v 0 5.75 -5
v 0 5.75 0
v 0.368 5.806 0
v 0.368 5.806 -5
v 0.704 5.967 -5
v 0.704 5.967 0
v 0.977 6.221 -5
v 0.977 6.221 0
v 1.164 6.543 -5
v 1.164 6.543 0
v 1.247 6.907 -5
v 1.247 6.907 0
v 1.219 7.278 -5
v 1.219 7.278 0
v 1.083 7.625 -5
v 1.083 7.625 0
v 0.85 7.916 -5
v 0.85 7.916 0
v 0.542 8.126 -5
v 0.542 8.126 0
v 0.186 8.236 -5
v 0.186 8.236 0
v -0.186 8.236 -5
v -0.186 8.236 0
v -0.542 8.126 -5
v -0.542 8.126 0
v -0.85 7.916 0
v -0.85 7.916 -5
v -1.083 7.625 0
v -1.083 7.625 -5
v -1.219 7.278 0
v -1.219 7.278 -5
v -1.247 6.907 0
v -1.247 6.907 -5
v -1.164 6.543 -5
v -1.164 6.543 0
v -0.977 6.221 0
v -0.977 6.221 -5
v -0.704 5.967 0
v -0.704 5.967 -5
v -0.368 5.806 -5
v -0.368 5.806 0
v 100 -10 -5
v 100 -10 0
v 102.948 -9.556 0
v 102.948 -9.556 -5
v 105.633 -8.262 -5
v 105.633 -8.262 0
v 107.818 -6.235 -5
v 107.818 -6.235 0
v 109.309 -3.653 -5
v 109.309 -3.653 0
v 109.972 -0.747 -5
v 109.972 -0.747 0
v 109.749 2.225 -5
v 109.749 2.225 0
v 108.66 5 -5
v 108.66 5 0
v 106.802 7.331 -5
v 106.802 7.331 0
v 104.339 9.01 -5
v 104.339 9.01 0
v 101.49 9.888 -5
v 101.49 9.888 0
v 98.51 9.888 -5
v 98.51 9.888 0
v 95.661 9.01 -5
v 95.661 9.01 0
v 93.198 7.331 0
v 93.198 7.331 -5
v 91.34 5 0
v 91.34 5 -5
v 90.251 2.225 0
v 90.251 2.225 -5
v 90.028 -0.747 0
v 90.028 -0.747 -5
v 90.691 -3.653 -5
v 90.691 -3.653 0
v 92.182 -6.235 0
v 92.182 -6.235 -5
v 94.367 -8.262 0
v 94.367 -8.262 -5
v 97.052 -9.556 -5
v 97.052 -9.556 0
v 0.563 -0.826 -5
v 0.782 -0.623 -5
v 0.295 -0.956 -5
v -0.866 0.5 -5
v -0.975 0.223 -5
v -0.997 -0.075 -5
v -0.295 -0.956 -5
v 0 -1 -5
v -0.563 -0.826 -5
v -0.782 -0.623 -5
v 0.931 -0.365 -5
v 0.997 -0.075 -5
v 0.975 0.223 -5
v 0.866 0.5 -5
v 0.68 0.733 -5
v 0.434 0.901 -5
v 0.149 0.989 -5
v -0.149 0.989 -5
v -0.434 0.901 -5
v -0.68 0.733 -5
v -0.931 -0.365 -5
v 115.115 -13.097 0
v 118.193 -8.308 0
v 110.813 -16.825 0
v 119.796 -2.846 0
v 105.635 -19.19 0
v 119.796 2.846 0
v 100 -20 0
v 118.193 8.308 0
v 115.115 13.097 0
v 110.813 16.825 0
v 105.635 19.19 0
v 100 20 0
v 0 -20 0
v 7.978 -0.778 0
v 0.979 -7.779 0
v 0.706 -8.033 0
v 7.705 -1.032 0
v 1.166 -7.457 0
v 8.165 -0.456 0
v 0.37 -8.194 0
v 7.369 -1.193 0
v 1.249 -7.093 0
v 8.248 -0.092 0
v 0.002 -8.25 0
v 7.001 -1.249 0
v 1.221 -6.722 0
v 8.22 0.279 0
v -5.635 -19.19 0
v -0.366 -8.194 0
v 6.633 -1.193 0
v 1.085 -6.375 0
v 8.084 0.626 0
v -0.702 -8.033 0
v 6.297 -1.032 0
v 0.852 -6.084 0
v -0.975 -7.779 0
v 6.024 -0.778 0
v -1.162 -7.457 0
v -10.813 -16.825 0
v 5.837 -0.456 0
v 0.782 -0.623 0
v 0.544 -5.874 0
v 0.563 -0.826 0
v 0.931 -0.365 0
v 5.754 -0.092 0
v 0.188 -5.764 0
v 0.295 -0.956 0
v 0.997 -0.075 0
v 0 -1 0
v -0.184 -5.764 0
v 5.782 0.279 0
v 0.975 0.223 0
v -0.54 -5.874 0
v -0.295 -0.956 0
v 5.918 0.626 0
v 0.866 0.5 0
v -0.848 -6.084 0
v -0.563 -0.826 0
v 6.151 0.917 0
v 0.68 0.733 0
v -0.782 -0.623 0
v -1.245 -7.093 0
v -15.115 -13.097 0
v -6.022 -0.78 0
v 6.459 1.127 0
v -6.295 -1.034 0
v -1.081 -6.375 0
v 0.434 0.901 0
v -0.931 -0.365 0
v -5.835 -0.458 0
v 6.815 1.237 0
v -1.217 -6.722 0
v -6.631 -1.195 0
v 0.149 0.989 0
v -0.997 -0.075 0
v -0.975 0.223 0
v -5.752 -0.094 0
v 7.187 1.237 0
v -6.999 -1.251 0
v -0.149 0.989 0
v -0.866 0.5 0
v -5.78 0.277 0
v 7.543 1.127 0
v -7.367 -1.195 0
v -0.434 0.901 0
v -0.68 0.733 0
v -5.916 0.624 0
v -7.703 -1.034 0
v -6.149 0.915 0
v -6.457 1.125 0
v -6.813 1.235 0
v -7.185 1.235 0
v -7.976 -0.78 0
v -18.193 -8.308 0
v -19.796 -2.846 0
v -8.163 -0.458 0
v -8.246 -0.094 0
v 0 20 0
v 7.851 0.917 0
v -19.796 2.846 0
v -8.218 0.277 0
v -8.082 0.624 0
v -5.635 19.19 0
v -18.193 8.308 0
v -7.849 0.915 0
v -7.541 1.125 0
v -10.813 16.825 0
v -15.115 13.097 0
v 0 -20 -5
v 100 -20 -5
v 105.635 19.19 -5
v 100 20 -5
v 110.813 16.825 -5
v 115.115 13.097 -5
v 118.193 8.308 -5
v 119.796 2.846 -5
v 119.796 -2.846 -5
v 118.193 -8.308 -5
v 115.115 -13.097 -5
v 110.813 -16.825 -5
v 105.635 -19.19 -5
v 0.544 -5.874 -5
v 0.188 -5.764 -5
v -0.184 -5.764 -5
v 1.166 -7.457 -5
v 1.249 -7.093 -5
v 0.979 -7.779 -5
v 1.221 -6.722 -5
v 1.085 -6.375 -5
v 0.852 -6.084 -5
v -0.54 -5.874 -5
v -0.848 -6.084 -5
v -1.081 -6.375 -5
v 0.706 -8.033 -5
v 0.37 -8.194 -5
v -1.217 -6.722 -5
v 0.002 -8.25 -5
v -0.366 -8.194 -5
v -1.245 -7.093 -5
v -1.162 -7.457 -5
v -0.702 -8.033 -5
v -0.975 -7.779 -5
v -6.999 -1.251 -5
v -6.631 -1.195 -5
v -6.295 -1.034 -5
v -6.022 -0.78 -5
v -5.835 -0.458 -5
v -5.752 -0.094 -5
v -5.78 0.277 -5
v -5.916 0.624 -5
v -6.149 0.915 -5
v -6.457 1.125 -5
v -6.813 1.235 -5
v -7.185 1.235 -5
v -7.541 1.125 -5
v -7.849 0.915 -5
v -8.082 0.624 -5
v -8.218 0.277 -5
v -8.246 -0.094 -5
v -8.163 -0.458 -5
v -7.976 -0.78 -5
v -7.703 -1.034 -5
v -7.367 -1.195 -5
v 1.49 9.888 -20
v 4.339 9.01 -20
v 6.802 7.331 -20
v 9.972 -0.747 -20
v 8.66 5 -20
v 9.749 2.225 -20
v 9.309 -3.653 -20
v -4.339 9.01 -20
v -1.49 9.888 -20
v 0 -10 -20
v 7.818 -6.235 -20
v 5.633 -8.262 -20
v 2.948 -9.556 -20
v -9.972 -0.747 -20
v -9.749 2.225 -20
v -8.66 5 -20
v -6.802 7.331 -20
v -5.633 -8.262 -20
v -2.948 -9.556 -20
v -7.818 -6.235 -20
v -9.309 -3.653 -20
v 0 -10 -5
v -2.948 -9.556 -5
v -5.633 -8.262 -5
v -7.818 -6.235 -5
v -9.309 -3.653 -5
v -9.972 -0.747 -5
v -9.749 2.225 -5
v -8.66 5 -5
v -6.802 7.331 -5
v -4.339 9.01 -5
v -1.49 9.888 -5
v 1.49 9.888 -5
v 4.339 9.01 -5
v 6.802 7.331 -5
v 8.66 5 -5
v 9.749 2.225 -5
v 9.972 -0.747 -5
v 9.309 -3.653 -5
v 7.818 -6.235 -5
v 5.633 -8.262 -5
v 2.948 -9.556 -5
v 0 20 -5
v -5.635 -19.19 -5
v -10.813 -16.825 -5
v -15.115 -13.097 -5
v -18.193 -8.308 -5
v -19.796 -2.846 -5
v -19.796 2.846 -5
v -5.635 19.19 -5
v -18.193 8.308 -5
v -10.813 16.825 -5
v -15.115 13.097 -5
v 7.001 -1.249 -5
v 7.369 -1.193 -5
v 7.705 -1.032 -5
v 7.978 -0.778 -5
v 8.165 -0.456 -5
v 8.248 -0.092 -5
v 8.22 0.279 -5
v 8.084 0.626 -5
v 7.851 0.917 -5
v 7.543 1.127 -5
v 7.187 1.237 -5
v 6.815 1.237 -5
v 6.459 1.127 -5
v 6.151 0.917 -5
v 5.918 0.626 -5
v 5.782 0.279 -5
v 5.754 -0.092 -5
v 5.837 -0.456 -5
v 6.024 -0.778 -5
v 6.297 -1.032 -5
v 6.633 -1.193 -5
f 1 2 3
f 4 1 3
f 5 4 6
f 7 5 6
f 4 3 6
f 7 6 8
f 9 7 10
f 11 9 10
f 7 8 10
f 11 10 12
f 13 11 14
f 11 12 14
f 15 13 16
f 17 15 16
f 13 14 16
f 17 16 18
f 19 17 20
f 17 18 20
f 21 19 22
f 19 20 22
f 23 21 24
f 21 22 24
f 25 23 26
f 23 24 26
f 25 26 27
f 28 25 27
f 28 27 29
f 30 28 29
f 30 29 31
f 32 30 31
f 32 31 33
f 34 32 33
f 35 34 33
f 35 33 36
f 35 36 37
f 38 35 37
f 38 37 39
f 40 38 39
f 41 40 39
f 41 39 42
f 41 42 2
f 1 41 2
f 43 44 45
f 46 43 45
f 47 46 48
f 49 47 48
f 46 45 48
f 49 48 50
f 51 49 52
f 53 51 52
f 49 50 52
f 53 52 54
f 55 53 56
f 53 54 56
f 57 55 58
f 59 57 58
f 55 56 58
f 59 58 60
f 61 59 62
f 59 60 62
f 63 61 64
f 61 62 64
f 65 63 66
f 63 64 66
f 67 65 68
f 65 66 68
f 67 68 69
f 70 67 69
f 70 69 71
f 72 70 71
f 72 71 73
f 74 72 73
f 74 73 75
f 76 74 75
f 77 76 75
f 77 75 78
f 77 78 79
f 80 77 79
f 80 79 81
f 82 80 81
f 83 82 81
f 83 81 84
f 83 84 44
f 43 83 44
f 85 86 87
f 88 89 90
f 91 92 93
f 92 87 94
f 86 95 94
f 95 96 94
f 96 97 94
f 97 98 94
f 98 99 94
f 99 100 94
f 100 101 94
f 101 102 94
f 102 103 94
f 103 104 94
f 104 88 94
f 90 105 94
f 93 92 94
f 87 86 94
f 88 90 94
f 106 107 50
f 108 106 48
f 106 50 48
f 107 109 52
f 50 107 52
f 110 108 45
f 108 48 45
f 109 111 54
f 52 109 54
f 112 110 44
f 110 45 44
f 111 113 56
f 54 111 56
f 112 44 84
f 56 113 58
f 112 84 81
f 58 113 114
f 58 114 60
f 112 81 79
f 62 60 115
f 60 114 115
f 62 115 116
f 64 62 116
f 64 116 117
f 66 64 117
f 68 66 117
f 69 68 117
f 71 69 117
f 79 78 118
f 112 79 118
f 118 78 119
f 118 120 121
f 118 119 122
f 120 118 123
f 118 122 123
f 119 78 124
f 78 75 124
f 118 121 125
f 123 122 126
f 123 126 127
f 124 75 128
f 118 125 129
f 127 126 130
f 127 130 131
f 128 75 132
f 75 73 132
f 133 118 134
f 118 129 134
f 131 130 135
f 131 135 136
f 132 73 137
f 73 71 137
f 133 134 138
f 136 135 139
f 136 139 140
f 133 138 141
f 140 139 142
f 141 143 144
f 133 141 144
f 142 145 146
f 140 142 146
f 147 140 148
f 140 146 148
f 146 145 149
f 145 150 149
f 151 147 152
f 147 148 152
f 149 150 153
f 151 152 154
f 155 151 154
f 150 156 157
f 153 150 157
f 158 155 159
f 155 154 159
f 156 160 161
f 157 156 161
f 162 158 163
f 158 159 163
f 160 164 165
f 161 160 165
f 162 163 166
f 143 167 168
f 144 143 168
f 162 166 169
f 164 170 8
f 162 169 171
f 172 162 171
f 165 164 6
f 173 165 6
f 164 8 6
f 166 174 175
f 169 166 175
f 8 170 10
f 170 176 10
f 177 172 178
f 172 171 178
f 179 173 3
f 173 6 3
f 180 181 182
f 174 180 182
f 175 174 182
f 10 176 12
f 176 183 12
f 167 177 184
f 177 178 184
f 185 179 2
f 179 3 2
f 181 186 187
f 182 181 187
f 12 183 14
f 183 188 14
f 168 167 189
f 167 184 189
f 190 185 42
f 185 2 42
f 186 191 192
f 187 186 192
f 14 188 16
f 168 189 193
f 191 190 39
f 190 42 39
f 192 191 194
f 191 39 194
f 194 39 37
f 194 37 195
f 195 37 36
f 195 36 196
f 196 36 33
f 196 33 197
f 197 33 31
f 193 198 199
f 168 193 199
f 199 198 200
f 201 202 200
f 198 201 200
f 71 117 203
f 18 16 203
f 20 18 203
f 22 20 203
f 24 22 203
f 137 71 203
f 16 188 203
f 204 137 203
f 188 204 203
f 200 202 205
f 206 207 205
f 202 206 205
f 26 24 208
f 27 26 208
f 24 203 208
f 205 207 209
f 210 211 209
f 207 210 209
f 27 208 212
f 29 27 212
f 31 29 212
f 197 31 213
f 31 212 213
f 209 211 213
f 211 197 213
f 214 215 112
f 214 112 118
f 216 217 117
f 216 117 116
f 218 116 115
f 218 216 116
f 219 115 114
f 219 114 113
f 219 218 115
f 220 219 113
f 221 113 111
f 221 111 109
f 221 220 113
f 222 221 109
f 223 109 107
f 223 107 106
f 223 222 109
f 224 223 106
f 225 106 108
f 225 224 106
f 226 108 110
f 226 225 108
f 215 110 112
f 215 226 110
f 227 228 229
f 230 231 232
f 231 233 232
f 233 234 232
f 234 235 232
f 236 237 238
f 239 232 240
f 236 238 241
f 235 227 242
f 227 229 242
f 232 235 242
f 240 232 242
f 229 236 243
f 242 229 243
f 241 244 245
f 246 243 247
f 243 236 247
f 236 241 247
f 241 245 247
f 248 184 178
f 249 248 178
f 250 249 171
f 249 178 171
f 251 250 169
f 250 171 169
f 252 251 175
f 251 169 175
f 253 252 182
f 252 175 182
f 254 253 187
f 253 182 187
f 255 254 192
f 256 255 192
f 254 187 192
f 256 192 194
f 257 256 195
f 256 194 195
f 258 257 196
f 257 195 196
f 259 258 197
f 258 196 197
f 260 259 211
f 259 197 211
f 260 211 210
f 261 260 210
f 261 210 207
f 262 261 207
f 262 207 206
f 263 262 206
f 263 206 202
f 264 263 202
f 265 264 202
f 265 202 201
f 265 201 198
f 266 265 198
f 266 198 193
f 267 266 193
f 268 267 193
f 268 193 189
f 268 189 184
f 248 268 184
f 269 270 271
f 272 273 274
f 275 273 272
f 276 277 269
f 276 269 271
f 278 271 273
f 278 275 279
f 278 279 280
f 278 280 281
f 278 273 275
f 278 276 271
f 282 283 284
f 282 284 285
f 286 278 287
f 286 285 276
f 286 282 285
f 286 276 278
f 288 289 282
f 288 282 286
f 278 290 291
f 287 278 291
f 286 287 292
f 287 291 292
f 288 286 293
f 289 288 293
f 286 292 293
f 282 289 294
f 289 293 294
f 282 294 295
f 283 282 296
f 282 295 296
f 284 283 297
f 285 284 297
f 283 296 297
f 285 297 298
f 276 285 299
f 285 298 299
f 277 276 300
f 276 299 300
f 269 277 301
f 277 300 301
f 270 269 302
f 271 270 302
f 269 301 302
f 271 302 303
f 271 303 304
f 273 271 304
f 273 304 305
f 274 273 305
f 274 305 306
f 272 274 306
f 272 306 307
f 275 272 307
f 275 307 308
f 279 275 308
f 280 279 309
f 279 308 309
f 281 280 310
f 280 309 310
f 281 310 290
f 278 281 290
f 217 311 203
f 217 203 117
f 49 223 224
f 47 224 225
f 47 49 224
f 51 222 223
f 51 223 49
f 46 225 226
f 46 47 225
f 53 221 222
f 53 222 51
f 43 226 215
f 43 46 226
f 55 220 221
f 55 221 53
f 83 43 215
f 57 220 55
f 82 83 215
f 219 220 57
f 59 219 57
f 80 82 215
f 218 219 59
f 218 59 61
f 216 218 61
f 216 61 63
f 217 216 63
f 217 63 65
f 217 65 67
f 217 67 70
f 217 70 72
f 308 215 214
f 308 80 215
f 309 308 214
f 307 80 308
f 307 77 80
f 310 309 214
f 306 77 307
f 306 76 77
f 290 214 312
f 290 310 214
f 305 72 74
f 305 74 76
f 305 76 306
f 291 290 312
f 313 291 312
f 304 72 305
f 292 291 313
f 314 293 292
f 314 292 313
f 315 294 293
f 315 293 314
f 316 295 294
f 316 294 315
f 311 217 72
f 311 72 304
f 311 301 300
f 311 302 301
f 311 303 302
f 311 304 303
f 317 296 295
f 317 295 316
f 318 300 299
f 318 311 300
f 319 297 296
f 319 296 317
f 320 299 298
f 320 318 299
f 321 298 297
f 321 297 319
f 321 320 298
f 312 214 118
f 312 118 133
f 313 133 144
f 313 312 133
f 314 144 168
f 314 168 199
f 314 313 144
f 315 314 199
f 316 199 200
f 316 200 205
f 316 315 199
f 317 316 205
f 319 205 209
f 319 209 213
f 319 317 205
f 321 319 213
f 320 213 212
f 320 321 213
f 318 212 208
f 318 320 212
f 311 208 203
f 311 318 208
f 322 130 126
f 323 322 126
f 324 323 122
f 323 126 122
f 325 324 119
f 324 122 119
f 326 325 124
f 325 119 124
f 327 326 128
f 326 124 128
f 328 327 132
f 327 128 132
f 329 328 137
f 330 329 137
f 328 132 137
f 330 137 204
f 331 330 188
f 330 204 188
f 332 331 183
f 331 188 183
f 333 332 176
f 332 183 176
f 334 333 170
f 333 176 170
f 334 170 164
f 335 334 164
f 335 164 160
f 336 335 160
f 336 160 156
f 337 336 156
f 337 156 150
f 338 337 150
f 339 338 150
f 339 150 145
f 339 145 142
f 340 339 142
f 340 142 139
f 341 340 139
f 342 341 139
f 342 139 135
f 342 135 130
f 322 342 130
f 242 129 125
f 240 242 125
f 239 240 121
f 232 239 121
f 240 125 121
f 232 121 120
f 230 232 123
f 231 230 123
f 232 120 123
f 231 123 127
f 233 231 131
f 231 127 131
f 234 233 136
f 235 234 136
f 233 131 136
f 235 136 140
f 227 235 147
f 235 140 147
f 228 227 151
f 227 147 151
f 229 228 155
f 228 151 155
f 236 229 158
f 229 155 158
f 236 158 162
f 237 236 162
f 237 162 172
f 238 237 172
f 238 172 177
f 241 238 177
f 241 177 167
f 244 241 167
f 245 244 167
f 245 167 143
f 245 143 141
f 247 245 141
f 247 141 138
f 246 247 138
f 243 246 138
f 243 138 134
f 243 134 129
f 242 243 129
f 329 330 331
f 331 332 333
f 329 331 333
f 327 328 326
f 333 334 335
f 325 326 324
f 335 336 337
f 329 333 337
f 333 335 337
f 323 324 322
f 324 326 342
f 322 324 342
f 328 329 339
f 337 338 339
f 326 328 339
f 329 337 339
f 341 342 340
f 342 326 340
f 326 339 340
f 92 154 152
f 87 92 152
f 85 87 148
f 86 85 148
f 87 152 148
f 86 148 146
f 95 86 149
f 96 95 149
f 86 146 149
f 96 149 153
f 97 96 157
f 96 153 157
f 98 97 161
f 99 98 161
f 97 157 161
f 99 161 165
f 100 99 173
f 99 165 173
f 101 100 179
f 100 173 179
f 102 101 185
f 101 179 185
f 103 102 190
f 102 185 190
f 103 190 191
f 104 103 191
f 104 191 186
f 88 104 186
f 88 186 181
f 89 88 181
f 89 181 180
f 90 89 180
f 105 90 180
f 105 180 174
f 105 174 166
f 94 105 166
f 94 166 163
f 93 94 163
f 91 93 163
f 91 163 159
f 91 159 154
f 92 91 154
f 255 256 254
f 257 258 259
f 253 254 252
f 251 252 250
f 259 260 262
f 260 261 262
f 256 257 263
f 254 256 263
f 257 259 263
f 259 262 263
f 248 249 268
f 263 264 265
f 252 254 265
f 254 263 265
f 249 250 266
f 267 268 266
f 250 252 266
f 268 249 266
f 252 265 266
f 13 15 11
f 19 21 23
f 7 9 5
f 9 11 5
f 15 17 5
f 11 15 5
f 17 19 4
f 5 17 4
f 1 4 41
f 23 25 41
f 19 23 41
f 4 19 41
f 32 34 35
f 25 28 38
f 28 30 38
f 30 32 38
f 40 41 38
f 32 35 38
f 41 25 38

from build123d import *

# Parameters (mm, degrees)
BOSS_EXTRUDE1_DEPTH   = 5
CUT_EXTRUDE1_REACH    = 123.758
SKETCH2_R             = 1
SKETCH2_R_2           = 1.25
CUT_EXTRUDE2_REACH    = 123.758
SKETCH3_R             = 10
SKETCH4_R             = 10
BOSS_EXTRUDE2_DEPTH   = 15
BODY_MOVE_COPY1_ANGLE = 90


with BuildPart() as part:
    # Sketch1 → Boss-Extrude1 (new body)
    with BuildSketch(Plane(origin=(0, 0, 0), x_dir=(1, 0, 0), z_dir=(0, 1, 0))):
        with BuildLine():
            Line((100, -20), (0, -20))
            ThreePointArc((0, -20), (-20, 0), (0, 20))
            Line((0, 20), (100, 20))
            ThreePointArc((100, 20), (120, 0), (100, -20))
        make_face()
    extrude(amount=BOSS_EXTRUDE1_DEPTH)

    # Sketch2 → Cut-Extrude1 (cut, up to next)
    with BuildSketch(Plane(origin=(0, 5, 0), x_dir=(1, 0, 0), z_dir=(0, 1, 0)), mode=Mode.PRIVATE) as cut_extrude1_sk1:
        with Locations(Location((0, 0, 0), (0, 0, 270))):
            Circle(SKETCH2_R)
    cut_extrude1_tool1 = extrude(cut_extrude1_sk1.sketch, amount=-CUT_EXTRUDE1_REACH, mode=Mode.PRIVATE) & part.part
    # Sketch2 → Cut-Extrude1 (cut, up to next)
    with BuildSketch(Plane(origin=(0, 5, 0), x_dir=(1, 0, 0), z_dir=(0, 1, 0)), mode=Mode.PRIVATE) as cut_extrude1_sk2:
        with Locations(Location((0, 7, 0), (0, 0, 270))):
            Circle(SKETCH2_R_2)
    cut_extrude1_tool2 = extrude(cut_extrude1_sk2.sketch, amount=-CUT_EXTRUDE1_REACH, mode=Mode.PRIVATE) & part.part
    # Sketch2 → Cut-Extrude1 (cut, up to next)
    with BuildSketch(Plane(origin=(0, 5, 0), x_dir=(1, 0, 0), z_dir=(0, 1, 0)), mode=Mode.PRIVATE) as cut_extrude1_sk3:
        with Locations(Location((7.001, 0.001, 0), (0, 0, 270))):
            Circle(SKETCH2_R_2)
    cut_extrude1_tool3 = extrude(cut_extrude1_sk3.sketch, amount=-CUT_EXTRUDE1_REACH, mode=Mode.PRIVATE) & part.part
    # Sketch2 → Cut-Extrude1 (cut, up to next)
    with BuildSketch(Plane(origin=(0, 5, 0), x_dir=(1, 0, 0), z_dir=(0, 1, 0)), mode=Mode.PRIVATE) as cut_extrude1_sk4:
        with Locations(Location((0.002, -7, 0), (0, 0, 270))):
            Circle(SKETCH2_R_2)
    cut_extrude1_tool4 = extrude(cut_extrude1_sk4.sketch, amount=-CUT_EXTRUDE1_REACH, mode=Mode.PRIVATE) & part.part
    # Sketch2 → Cut-Extrude1 (cut, up to next)
    with BuildSketch(Plane(origin=(0, 5, 0), x_dir=(1, 0, 0), z_dir=(0, 1, 0)), mode=Mode.PRIVATE) as cut_extrude1_sk5:
        with Locations(Location((-6.999, -0.001, 0), (0, 0, 270))):
            Circle(SKETCH2_R_2)
    cut_extrude1_tool5 = extrude(cut_extrude1_sk5.sketch, amount=-CUT_EXTRUDE1_REACH, mode=Mode.PRIVATE) & part.part
    add(cut_extrude1_tool1.solids().sort_by_distance((0, 5, 0))[0], mode=Mode.SUBTRACT)
    add(cut_extrude1_tool2.solids().sort_by_distance((0, 5, -7))[0], mode=Mode.SUBTRACT)
    add(cut_extrude1_tool3.solids().sort_by_distance((7.001, 5, -0.001))[0], mode=Mode.SUBTRACT)
    add(cut_extrude1_tool4.solids().sort_by_distance((0.002, 5, 7))[0], mode=Mode.SUBTRACT)
    add(cut_extrude1_tool5.solids().sort_by_distance((-6.999, 5, 0.001))[0], mode=Mode.SUBTRACT)

    # Sketch3 → Cut-Extrude2 (cut, up to next)
    with BuildSketch(Plane(origin=(0, 5, 0), x_dir=(1, 0, 0), z_dir=(0, 1, 0)), mode=Mode.PRIVATE) as cut_extrude2_sk1:
        with Locations(Location((100, 0, 0), (0, 0, 270))):
            Circle(SKETCH3_R)
    cut_extrude2_tool1 = extrude(cut_extrude2_sk1.sketch, amount=-CUT_EXTRUDE2_REACH, mode=Mode.PRIVATE) & part.part
    add(cut_extrude2_tool1.solids().sort_by_distance((100, 5, 0))[0], mode=Mode.SUBTRACT)

    # Sketch4 → Boss-Extrude2 (add)
    with BuildSketch(Plane.XZ):
        with Locations(Location((0, 0, 0), (0, 0, 90))):
            Circle(SKETCH4_R)
    extrude(amount=BOSS_EXTRUDE2_DEPTH)


with BuildPart() as part_1:
    # Body-Move/Copy1: moved
    add(part.part.rotate(Axis((0, 0, 0), (1, 0, 0)), BODY_MOVE_COPY1_ANGLE))


with BuildPart() as part_2:
    # Body-Move/Copy2: moved
    add(part_1.part.moved(Location((0, 0, -5))))


solid = part_2.part
